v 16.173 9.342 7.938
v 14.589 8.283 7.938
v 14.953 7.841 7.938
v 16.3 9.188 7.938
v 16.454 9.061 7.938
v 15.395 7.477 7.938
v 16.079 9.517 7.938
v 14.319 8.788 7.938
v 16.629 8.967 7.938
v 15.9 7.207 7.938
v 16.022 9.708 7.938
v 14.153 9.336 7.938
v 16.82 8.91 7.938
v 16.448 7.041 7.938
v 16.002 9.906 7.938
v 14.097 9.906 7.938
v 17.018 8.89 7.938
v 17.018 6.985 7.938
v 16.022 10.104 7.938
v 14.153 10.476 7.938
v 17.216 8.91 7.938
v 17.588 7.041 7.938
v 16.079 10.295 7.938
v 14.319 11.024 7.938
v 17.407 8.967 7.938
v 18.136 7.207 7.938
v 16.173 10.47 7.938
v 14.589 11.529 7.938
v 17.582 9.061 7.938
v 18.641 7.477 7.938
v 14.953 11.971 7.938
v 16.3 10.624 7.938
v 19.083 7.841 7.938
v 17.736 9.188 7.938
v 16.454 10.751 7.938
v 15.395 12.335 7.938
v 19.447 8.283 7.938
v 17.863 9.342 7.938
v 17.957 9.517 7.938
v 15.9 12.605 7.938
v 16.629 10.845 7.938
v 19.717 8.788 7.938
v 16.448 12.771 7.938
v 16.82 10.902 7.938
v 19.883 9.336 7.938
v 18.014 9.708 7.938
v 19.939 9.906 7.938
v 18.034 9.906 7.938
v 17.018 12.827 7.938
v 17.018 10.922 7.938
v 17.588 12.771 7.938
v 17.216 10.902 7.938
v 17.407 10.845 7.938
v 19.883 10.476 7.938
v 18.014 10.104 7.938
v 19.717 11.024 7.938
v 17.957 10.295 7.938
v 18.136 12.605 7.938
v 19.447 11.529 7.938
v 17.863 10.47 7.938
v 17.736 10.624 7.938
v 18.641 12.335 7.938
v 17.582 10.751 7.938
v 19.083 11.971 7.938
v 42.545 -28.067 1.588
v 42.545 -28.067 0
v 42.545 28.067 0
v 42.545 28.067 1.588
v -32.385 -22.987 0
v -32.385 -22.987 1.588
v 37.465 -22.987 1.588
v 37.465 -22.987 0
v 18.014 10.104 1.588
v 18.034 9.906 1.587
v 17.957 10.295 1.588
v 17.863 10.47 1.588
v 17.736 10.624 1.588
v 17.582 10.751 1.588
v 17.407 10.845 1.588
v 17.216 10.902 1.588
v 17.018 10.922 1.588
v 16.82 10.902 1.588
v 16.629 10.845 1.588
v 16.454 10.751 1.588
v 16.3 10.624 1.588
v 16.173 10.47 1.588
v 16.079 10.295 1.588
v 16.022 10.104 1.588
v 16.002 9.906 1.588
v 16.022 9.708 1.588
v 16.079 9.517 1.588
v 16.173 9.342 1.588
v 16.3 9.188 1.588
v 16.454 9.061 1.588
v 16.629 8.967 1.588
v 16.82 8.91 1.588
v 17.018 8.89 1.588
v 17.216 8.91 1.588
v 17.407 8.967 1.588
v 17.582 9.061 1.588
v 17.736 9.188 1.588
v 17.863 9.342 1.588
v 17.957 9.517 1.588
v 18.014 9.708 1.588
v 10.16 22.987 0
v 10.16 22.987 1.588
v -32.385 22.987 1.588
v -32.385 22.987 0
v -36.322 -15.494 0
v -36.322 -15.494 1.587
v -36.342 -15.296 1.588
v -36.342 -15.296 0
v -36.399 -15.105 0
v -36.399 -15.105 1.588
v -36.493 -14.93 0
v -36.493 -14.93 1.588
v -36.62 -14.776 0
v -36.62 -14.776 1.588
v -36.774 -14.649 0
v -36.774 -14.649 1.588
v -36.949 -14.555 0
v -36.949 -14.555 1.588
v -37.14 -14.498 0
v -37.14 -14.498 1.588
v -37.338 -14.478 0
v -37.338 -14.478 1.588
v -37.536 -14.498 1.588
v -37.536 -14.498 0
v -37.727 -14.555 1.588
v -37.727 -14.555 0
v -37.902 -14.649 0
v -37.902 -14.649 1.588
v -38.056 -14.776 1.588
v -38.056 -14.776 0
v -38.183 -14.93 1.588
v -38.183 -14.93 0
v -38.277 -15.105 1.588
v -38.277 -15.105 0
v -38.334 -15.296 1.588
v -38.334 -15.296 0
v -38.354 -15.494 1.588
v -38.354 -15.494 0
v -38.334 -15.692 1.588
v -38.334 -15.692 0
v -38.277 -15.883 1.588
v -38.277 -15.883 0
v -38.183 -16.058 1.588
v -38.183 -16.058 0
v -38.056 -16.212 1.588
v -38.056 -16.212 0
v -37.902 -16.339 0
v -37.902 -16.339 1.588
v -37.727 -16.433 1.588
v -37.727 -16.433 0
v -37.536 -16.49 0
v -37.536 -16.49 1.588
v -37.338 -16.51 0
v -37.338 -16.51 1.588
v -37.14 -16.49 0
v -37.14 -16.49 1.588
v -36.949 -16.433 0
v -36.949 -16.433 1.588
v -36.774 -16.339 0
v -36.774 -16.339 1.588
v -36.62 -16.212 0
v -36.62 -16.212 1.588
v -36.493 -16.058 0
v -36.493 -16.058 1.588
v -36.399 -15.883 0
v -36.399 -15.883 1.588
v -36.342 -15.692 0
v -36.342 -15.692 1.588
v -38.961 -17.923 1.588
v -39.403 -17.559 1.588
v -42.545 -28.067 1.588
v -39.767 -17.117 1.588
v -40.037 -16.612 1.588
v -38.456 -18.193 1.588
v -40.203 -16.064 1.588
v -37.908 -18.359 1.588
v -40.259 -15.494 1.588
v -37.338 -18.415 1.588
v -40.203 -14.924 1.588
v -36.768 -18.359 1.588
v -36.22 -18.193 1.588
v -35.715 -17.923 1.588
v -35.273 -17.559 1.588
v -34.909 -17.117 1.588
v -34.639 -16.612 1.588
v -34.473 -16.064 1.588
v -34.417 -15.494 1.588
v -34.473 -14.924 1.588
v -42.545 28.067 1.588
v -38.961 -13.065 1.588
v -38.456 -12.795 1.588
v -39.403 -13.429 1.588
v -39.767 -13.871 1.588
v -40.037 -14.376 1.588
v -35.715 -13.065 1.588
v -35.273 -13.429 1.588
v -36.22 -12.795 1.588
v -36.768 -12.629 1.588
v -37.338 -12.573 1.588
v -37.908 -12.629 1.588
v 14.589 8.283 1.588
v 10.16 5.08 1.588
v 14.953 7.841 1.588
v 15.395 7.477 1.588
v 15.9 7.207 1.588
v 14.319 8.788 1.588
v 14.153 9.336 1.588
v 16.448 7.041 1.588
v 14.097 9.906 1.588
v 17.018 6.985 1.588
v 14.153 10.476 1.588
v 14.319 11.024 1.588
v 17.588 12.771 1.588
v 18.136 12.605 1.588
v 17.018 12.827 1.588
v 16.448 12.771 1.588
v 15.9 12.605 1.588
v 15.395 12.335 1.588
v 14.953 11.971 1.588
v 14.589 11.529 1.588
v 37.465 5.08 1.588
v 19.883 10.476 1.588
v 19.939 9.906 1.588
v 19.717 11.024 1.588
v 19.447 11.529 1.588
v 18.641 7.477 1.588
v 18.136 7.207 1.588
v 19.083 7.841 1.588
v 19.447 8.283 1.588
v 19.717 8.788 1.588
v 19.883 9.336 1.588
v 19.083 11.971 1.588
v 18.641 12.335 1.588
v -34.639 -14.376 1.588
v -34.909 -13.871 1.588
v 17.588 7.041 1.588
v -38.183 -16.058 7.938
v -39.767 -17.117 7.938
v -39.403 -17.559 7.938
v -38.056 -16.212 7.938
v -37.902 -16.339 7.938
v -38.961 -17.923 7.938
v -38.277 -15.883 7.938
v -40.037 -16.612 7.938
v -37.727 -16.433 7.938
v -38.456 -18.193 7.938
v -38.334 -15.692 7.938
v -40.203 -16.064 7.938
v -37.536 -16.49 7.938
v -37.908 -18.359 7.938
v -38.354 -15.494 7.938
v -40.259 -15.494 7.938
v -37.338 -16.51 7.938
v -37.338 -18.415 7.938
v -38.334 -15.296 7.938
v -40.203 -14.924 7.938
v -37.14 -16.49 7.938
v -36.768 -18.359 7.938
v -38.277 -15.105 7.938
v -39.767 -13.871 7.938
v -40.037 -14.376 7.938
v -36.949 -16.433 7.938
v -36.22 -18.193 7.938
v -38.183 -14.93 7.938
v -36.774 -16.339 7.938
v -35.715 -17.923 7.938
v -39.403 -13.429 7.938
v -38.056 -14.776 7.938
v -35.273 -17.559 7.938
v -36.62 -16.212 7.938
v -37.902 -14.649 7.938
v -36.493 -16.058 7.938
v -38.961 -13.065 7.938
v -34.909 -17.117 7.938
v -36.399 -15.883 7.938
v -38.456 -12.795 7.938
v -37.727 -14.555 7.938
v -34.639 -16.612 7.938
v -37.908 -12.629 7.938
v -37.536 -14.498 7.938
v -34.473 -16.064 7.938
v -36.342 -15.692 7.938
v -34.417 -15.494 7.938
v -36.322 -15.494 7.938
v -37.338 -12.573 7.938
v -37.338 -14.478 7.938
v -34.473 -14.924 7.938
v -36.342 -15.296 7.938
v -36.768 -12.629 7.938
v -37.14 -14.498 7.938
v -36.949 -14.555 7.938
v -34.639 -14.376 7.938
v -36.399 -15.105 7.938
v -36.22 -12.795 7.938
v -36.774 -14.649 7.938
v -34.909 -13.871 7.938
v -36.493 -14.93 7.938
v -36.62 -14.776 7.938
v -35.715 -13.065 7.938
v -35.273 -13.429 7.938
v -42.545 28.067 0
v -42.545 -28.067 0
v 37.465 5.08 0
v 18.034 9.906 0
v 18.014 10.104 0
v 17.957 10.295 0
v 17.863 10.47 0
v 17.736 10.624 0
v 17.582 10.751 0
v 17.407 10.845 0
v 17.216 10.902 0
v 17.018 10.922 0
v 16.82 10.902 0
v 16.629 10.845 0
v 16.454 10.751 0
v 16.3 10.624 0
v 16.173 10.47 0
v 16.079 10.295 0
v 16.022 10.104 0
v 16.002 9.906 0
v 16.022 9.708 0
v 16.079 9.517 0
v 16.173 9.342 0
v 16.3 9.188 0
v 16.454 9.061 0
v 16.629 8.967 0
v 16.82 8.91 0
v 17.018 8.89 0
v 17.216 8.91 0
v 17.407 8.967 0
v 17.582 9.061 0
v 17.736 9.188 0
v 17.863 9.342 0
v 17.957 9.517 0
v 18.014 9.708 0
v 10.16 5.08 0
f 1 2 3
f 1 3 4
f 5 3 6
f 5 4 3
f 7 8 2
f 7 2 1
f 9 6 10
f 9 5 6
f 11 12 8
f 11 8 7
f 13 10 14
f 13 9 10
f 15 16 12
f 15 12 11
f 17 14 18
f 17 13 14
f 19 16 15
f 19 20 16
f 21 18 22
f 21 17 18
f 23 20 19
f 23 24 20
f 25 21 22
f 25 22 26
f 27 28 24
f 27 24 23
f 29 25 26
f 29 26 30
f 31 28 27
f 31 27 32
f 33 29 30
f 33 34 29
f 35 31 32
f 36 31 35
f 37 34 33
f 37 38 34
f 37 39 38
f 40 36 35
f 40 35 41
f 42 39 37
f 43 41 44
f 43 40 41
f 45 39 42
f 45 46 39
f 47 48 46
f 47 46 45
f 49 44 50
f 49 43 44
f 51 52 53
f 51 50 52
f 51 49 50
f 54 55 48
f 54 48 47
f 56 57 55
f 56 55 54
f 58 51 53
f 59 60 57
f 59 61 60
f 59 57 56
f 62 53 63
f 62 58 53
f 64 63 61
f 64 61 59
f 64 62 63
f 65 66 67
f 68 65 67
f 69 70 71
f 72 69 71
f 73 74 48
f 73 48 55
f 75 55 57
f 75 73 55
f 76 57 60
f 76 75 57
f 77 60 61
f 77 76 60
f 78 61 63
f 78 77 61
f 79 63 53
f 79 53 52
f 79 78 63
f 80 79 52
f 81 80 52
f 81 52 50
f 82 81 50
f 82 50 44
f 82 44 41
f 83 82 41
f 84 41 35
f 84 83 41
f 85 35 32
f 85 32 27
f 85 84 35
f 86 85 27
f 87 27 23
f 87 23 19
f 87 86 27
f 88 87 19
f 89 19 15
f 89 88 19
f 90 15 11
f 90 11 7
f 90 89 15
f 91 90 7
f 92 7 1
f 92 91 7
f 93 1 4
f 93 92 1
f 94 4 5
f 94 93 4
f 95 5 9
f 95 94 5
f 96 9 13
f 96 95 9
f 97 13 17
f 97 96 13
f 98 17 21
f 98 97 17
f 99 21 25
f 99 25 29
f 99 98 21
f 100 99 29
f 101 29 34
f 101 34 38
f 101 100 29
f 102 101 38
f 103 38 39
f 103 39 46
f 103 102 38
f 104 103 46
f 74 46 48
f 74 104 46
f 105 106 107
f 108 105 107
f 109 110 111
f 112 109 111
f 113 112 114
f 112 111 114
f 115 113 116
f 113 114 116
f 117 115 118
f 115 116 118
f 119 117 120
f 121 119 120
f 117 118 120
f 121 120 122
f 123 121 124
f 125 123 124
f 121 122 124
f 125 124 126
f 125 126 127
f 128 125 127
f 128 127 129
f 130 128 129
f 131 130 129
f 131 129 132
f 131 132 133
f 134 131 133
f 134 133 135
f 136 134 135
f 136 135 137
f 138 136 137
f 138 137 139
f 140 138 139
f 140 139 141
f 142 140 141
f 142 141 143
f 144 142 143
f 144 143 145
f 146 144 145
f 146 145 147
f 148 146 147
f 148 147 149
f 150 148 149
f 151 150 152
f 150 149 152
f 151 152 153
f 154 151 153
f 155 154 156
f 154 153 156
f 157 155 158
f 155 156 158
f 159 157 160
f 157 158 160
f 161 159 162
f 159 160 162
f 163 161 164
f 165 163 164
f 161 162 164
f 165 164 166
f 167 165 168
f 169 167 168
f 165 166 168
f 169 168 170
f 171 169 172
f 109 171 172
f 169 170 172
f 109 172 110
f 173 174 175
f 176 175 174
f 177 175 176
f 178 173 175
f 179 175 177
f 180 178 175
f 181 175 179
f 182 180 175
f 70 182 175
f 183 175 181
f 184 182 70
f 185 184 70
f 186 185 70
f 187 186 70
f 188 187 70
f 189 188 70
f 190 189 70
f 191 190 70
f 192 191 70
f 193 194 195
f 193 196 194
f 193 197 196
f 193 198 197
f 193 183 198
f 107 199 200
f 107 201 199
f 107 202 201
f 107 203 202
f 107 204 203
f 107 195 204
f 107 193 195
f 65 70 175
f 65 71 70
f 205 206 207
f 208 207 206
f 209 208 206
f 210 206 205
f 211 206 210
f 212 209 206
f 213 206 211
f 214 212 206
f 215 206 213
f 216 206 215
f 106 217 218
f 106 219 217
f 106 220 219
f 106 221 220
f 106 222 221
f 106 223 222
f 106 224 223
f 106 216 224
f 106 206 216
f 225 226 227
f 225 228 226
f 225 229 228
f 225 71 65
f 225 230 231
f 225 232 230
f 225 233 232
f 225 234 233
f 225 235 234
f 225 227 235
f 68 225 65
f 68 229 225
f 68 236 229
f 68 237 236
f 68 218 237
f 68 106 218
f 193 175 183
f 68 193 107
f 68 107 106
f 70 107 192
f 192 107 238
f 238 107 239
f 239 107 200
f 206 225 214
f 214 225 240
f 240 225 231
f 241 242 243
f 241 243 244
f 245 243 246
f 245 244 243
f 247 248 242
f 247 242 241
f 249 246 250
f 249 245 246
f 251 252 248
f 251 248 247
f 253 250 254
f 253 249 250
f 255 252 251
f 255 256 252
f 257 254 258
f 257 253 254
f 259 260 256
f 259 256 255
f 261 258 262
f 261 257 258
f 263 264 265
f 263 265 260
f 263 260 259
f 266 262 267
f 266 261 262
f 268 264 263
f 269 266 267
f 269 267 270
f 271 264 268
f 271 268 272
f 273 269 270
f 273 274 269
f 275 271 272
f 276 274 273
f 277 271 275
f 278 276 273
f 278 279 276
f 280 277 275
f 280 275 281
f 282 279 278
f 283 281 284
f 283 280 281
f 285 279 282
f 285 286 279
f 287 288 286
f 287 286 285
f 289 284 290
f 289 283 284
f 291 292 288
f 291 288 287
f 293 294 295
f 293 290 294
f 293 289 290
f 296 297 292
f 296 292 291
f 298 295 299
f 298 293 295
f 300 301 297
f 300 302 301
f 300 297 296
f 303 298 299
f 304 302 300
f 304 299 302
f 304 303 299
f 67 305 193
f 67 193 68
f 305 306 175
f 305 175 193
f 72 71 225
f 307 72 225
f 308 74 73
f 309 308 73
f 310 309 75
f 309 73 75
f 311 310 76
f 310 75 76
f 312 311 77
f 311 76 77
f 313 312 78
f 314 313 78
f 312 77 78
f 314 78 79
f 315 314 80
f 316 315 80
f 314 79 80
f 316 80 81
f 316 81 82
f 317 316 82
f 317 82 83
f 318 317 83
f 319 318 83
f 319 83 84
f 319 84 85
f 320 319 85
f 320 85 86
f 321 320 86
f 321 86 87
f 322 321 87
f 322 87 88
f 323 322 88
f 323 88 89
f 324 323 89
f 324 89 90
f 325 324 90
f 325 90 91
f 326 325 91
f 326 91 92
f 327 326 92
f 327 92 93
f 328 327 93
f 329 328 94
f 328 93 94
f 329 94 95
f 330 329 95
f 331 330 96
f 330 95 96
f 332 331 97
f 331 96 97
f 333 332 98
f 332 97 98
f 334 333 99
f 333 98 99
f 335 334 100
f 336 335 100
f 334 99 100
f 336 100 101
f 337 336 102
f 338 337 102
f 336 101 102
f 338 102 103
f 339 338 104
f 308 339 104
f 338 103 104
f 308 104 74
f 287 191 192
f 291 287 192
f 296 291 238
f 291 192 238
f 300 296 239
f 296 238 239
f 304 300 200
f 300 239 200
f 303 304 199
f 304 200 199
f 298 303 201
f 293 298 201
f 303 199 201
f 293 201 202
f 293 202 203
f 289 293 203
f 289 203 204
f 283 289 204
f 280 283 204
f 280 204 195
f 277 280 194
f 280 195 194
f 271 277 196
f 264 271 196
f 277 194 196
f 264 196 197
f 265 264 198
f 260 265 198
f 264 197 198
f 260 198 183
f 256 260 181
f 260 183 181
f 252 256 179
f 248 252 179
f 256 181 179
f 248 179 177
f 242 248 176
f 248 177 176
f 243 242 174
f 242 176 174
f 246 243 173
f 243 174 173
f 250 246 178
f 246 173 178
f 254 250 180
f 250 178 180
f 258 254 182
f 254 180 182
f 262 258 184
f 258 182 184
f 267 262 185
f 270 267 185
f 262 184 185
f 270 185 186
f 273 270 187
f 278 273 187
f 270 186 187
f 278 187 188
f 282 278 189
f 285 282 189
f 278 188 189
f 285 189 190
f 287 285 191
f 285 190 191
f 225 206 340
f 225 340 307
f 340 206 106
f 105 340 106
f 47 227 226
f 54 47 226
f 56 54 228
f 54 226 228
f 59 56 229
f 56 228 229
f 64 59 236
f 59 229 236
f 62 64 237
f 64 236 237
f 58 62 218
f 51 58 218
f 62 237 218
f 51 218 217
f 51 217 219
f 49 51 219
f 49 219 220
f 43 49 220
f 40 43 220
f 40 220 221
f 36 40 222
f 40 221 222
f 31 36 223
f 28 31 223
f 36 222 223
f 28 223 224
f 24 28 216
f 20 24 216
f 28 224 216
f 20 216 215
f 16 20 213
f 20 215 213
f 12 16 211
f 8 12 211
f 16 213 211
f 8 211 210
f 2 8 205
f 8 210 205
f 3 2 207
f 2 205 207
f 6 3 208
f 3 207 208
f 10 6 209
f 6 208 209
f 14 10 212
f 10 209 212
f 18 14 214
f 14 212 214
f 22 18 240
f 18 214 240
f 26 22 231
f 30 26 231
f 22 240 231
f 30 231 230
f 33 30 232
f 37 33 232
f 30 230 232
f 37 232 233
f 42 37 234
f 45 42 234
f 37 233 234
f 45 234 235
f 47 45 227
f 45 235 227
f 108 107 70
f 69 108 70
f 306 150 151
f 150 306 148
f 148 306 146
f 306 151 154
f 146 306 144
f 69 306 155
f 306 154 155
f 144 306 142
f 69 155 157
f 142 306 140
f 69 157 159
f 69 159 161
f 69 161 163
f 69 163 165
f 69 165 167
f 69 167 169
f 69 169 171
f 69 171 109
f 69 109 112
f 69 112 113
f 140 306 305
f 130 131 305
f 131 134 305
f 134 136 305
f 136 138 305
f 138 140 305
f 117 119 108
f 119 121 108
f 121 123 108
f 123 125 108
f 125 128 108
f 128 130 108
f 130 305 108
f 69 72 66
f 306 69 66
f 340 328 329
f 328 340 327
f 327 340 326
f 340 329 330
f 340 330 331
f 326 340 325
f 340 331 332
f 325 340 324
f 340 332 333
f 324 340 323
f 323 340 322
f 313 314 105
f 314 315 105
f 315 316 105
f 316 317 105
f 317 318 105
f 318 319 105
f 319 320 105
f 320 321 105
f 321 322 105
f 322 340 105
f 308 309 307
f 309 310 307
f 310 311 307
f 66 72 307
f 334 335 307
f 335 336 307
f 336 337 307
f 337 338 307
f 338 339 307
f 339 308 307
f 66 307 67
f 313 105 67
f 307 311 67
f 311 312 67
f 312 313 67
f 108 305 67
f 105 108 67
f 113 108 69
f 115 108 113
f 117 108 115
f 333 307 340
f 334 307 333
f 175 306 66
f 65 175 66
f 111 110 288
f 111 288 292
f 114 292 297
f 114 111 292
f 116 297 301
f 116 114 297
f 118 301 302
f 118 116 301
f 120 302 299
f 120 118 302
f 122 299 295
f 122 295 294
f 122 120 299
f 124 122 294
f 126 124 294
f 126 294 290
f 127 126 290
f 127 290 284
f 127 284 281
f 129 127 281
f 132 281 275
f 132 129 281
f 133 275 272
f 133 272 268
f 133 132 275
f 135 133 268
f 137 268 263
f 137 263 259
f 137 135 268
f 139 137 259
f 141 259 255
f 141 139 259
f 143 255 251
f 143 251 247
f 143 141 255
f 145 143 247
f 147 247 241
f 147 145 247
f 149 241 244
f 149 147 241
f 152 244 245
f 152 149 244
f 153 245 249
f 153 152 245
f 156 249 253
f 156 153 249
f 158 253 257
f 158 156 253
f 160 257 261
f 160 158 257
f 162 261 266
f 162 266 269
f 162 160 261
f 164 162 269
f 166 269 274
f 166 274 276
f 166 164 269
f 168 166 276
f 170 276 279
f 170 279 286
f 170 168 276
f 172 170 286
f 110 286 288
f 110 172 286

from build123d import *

# Parameters (mm, degrees)
F0_W     = 85.09
F0_H     = 56.134
F1_DEPTH = 1.5875
F2_R     = 2.921
F2_R_2   = 1.016
F3_DEPTH = 6.35
F4_DEPTH = 6.35
F5_W     = 32.385
F5_H     = 22.987
F5_W_2   = 27.305
F5_H_2   = 5.08
F6_DEPTH = 6.35


# Not quite as in the source:
# - a feature names something its author has since deleted; it is built from what else it names


with BuildPart() as f1:
    # F0 (on Top) → F1 (new body)
    with BuildSketch(Plane.XY):
        Rectangle(F0_W, F0_H)
    extrude(amount=F1_DEPTH)

    # F2 (on face) → F3 (join)
    with BuildSketch(Plane.XY.offset(1.5875)):
        with Locations((17.018, 9.906)):
            Circle(F2_R)
        with Locations((17.018, 9.906)):
            Circle(F2_R_2, mode=Mode.SUBTRACT)
        with Locations((-37.338, -15.494)):
            Circle(F2_R)
        with Locations((-37.338, -15.494)):
            Circle(F2_R_2, mode=Mode.SUBTRACT)
    extrude(amount=F3_DEPTH)

    # F2 (on face) → F4 (cut)
    with BuildSketch(Plane.XY.offset(1.5875)):
        with Locations((-37.338, -15.494)):
            Circle(F2_R_2)
        with Locations((17.018, 9.906)):
            Circle(F2_R_2)
    extrude(amount=-F4_DEPTH, mode=Mode.SUBTRACT)

    # F5 (on face) → F6 (cut)
    with BuildSketch(Plane.XY.offset(1.5875)):
        with Locations((-16.1925, 11.4935)):
            Rectangle(F5_W, F5_H)
        Polygon((0, 22.987), (0, 0), (10.16, 0), (10.16, 5.08), (10.16, 22.987), align=None)
        with Locations((23.8125, 2.54)):
            Rectangle(F5_W_2, F5_H_2)
        Polygon((10.16, 0), (0, 0), (0, -22.987), (37.465, -22.987), (37.465, 0), align=None)
        with Locations((-16.1925, -11.4935)):
            Rectangle(F5_W, F5_H)
    extrude(amount=-F6_DEPTH, mode=Mode.SUBTRACT)


solid = f1.part
